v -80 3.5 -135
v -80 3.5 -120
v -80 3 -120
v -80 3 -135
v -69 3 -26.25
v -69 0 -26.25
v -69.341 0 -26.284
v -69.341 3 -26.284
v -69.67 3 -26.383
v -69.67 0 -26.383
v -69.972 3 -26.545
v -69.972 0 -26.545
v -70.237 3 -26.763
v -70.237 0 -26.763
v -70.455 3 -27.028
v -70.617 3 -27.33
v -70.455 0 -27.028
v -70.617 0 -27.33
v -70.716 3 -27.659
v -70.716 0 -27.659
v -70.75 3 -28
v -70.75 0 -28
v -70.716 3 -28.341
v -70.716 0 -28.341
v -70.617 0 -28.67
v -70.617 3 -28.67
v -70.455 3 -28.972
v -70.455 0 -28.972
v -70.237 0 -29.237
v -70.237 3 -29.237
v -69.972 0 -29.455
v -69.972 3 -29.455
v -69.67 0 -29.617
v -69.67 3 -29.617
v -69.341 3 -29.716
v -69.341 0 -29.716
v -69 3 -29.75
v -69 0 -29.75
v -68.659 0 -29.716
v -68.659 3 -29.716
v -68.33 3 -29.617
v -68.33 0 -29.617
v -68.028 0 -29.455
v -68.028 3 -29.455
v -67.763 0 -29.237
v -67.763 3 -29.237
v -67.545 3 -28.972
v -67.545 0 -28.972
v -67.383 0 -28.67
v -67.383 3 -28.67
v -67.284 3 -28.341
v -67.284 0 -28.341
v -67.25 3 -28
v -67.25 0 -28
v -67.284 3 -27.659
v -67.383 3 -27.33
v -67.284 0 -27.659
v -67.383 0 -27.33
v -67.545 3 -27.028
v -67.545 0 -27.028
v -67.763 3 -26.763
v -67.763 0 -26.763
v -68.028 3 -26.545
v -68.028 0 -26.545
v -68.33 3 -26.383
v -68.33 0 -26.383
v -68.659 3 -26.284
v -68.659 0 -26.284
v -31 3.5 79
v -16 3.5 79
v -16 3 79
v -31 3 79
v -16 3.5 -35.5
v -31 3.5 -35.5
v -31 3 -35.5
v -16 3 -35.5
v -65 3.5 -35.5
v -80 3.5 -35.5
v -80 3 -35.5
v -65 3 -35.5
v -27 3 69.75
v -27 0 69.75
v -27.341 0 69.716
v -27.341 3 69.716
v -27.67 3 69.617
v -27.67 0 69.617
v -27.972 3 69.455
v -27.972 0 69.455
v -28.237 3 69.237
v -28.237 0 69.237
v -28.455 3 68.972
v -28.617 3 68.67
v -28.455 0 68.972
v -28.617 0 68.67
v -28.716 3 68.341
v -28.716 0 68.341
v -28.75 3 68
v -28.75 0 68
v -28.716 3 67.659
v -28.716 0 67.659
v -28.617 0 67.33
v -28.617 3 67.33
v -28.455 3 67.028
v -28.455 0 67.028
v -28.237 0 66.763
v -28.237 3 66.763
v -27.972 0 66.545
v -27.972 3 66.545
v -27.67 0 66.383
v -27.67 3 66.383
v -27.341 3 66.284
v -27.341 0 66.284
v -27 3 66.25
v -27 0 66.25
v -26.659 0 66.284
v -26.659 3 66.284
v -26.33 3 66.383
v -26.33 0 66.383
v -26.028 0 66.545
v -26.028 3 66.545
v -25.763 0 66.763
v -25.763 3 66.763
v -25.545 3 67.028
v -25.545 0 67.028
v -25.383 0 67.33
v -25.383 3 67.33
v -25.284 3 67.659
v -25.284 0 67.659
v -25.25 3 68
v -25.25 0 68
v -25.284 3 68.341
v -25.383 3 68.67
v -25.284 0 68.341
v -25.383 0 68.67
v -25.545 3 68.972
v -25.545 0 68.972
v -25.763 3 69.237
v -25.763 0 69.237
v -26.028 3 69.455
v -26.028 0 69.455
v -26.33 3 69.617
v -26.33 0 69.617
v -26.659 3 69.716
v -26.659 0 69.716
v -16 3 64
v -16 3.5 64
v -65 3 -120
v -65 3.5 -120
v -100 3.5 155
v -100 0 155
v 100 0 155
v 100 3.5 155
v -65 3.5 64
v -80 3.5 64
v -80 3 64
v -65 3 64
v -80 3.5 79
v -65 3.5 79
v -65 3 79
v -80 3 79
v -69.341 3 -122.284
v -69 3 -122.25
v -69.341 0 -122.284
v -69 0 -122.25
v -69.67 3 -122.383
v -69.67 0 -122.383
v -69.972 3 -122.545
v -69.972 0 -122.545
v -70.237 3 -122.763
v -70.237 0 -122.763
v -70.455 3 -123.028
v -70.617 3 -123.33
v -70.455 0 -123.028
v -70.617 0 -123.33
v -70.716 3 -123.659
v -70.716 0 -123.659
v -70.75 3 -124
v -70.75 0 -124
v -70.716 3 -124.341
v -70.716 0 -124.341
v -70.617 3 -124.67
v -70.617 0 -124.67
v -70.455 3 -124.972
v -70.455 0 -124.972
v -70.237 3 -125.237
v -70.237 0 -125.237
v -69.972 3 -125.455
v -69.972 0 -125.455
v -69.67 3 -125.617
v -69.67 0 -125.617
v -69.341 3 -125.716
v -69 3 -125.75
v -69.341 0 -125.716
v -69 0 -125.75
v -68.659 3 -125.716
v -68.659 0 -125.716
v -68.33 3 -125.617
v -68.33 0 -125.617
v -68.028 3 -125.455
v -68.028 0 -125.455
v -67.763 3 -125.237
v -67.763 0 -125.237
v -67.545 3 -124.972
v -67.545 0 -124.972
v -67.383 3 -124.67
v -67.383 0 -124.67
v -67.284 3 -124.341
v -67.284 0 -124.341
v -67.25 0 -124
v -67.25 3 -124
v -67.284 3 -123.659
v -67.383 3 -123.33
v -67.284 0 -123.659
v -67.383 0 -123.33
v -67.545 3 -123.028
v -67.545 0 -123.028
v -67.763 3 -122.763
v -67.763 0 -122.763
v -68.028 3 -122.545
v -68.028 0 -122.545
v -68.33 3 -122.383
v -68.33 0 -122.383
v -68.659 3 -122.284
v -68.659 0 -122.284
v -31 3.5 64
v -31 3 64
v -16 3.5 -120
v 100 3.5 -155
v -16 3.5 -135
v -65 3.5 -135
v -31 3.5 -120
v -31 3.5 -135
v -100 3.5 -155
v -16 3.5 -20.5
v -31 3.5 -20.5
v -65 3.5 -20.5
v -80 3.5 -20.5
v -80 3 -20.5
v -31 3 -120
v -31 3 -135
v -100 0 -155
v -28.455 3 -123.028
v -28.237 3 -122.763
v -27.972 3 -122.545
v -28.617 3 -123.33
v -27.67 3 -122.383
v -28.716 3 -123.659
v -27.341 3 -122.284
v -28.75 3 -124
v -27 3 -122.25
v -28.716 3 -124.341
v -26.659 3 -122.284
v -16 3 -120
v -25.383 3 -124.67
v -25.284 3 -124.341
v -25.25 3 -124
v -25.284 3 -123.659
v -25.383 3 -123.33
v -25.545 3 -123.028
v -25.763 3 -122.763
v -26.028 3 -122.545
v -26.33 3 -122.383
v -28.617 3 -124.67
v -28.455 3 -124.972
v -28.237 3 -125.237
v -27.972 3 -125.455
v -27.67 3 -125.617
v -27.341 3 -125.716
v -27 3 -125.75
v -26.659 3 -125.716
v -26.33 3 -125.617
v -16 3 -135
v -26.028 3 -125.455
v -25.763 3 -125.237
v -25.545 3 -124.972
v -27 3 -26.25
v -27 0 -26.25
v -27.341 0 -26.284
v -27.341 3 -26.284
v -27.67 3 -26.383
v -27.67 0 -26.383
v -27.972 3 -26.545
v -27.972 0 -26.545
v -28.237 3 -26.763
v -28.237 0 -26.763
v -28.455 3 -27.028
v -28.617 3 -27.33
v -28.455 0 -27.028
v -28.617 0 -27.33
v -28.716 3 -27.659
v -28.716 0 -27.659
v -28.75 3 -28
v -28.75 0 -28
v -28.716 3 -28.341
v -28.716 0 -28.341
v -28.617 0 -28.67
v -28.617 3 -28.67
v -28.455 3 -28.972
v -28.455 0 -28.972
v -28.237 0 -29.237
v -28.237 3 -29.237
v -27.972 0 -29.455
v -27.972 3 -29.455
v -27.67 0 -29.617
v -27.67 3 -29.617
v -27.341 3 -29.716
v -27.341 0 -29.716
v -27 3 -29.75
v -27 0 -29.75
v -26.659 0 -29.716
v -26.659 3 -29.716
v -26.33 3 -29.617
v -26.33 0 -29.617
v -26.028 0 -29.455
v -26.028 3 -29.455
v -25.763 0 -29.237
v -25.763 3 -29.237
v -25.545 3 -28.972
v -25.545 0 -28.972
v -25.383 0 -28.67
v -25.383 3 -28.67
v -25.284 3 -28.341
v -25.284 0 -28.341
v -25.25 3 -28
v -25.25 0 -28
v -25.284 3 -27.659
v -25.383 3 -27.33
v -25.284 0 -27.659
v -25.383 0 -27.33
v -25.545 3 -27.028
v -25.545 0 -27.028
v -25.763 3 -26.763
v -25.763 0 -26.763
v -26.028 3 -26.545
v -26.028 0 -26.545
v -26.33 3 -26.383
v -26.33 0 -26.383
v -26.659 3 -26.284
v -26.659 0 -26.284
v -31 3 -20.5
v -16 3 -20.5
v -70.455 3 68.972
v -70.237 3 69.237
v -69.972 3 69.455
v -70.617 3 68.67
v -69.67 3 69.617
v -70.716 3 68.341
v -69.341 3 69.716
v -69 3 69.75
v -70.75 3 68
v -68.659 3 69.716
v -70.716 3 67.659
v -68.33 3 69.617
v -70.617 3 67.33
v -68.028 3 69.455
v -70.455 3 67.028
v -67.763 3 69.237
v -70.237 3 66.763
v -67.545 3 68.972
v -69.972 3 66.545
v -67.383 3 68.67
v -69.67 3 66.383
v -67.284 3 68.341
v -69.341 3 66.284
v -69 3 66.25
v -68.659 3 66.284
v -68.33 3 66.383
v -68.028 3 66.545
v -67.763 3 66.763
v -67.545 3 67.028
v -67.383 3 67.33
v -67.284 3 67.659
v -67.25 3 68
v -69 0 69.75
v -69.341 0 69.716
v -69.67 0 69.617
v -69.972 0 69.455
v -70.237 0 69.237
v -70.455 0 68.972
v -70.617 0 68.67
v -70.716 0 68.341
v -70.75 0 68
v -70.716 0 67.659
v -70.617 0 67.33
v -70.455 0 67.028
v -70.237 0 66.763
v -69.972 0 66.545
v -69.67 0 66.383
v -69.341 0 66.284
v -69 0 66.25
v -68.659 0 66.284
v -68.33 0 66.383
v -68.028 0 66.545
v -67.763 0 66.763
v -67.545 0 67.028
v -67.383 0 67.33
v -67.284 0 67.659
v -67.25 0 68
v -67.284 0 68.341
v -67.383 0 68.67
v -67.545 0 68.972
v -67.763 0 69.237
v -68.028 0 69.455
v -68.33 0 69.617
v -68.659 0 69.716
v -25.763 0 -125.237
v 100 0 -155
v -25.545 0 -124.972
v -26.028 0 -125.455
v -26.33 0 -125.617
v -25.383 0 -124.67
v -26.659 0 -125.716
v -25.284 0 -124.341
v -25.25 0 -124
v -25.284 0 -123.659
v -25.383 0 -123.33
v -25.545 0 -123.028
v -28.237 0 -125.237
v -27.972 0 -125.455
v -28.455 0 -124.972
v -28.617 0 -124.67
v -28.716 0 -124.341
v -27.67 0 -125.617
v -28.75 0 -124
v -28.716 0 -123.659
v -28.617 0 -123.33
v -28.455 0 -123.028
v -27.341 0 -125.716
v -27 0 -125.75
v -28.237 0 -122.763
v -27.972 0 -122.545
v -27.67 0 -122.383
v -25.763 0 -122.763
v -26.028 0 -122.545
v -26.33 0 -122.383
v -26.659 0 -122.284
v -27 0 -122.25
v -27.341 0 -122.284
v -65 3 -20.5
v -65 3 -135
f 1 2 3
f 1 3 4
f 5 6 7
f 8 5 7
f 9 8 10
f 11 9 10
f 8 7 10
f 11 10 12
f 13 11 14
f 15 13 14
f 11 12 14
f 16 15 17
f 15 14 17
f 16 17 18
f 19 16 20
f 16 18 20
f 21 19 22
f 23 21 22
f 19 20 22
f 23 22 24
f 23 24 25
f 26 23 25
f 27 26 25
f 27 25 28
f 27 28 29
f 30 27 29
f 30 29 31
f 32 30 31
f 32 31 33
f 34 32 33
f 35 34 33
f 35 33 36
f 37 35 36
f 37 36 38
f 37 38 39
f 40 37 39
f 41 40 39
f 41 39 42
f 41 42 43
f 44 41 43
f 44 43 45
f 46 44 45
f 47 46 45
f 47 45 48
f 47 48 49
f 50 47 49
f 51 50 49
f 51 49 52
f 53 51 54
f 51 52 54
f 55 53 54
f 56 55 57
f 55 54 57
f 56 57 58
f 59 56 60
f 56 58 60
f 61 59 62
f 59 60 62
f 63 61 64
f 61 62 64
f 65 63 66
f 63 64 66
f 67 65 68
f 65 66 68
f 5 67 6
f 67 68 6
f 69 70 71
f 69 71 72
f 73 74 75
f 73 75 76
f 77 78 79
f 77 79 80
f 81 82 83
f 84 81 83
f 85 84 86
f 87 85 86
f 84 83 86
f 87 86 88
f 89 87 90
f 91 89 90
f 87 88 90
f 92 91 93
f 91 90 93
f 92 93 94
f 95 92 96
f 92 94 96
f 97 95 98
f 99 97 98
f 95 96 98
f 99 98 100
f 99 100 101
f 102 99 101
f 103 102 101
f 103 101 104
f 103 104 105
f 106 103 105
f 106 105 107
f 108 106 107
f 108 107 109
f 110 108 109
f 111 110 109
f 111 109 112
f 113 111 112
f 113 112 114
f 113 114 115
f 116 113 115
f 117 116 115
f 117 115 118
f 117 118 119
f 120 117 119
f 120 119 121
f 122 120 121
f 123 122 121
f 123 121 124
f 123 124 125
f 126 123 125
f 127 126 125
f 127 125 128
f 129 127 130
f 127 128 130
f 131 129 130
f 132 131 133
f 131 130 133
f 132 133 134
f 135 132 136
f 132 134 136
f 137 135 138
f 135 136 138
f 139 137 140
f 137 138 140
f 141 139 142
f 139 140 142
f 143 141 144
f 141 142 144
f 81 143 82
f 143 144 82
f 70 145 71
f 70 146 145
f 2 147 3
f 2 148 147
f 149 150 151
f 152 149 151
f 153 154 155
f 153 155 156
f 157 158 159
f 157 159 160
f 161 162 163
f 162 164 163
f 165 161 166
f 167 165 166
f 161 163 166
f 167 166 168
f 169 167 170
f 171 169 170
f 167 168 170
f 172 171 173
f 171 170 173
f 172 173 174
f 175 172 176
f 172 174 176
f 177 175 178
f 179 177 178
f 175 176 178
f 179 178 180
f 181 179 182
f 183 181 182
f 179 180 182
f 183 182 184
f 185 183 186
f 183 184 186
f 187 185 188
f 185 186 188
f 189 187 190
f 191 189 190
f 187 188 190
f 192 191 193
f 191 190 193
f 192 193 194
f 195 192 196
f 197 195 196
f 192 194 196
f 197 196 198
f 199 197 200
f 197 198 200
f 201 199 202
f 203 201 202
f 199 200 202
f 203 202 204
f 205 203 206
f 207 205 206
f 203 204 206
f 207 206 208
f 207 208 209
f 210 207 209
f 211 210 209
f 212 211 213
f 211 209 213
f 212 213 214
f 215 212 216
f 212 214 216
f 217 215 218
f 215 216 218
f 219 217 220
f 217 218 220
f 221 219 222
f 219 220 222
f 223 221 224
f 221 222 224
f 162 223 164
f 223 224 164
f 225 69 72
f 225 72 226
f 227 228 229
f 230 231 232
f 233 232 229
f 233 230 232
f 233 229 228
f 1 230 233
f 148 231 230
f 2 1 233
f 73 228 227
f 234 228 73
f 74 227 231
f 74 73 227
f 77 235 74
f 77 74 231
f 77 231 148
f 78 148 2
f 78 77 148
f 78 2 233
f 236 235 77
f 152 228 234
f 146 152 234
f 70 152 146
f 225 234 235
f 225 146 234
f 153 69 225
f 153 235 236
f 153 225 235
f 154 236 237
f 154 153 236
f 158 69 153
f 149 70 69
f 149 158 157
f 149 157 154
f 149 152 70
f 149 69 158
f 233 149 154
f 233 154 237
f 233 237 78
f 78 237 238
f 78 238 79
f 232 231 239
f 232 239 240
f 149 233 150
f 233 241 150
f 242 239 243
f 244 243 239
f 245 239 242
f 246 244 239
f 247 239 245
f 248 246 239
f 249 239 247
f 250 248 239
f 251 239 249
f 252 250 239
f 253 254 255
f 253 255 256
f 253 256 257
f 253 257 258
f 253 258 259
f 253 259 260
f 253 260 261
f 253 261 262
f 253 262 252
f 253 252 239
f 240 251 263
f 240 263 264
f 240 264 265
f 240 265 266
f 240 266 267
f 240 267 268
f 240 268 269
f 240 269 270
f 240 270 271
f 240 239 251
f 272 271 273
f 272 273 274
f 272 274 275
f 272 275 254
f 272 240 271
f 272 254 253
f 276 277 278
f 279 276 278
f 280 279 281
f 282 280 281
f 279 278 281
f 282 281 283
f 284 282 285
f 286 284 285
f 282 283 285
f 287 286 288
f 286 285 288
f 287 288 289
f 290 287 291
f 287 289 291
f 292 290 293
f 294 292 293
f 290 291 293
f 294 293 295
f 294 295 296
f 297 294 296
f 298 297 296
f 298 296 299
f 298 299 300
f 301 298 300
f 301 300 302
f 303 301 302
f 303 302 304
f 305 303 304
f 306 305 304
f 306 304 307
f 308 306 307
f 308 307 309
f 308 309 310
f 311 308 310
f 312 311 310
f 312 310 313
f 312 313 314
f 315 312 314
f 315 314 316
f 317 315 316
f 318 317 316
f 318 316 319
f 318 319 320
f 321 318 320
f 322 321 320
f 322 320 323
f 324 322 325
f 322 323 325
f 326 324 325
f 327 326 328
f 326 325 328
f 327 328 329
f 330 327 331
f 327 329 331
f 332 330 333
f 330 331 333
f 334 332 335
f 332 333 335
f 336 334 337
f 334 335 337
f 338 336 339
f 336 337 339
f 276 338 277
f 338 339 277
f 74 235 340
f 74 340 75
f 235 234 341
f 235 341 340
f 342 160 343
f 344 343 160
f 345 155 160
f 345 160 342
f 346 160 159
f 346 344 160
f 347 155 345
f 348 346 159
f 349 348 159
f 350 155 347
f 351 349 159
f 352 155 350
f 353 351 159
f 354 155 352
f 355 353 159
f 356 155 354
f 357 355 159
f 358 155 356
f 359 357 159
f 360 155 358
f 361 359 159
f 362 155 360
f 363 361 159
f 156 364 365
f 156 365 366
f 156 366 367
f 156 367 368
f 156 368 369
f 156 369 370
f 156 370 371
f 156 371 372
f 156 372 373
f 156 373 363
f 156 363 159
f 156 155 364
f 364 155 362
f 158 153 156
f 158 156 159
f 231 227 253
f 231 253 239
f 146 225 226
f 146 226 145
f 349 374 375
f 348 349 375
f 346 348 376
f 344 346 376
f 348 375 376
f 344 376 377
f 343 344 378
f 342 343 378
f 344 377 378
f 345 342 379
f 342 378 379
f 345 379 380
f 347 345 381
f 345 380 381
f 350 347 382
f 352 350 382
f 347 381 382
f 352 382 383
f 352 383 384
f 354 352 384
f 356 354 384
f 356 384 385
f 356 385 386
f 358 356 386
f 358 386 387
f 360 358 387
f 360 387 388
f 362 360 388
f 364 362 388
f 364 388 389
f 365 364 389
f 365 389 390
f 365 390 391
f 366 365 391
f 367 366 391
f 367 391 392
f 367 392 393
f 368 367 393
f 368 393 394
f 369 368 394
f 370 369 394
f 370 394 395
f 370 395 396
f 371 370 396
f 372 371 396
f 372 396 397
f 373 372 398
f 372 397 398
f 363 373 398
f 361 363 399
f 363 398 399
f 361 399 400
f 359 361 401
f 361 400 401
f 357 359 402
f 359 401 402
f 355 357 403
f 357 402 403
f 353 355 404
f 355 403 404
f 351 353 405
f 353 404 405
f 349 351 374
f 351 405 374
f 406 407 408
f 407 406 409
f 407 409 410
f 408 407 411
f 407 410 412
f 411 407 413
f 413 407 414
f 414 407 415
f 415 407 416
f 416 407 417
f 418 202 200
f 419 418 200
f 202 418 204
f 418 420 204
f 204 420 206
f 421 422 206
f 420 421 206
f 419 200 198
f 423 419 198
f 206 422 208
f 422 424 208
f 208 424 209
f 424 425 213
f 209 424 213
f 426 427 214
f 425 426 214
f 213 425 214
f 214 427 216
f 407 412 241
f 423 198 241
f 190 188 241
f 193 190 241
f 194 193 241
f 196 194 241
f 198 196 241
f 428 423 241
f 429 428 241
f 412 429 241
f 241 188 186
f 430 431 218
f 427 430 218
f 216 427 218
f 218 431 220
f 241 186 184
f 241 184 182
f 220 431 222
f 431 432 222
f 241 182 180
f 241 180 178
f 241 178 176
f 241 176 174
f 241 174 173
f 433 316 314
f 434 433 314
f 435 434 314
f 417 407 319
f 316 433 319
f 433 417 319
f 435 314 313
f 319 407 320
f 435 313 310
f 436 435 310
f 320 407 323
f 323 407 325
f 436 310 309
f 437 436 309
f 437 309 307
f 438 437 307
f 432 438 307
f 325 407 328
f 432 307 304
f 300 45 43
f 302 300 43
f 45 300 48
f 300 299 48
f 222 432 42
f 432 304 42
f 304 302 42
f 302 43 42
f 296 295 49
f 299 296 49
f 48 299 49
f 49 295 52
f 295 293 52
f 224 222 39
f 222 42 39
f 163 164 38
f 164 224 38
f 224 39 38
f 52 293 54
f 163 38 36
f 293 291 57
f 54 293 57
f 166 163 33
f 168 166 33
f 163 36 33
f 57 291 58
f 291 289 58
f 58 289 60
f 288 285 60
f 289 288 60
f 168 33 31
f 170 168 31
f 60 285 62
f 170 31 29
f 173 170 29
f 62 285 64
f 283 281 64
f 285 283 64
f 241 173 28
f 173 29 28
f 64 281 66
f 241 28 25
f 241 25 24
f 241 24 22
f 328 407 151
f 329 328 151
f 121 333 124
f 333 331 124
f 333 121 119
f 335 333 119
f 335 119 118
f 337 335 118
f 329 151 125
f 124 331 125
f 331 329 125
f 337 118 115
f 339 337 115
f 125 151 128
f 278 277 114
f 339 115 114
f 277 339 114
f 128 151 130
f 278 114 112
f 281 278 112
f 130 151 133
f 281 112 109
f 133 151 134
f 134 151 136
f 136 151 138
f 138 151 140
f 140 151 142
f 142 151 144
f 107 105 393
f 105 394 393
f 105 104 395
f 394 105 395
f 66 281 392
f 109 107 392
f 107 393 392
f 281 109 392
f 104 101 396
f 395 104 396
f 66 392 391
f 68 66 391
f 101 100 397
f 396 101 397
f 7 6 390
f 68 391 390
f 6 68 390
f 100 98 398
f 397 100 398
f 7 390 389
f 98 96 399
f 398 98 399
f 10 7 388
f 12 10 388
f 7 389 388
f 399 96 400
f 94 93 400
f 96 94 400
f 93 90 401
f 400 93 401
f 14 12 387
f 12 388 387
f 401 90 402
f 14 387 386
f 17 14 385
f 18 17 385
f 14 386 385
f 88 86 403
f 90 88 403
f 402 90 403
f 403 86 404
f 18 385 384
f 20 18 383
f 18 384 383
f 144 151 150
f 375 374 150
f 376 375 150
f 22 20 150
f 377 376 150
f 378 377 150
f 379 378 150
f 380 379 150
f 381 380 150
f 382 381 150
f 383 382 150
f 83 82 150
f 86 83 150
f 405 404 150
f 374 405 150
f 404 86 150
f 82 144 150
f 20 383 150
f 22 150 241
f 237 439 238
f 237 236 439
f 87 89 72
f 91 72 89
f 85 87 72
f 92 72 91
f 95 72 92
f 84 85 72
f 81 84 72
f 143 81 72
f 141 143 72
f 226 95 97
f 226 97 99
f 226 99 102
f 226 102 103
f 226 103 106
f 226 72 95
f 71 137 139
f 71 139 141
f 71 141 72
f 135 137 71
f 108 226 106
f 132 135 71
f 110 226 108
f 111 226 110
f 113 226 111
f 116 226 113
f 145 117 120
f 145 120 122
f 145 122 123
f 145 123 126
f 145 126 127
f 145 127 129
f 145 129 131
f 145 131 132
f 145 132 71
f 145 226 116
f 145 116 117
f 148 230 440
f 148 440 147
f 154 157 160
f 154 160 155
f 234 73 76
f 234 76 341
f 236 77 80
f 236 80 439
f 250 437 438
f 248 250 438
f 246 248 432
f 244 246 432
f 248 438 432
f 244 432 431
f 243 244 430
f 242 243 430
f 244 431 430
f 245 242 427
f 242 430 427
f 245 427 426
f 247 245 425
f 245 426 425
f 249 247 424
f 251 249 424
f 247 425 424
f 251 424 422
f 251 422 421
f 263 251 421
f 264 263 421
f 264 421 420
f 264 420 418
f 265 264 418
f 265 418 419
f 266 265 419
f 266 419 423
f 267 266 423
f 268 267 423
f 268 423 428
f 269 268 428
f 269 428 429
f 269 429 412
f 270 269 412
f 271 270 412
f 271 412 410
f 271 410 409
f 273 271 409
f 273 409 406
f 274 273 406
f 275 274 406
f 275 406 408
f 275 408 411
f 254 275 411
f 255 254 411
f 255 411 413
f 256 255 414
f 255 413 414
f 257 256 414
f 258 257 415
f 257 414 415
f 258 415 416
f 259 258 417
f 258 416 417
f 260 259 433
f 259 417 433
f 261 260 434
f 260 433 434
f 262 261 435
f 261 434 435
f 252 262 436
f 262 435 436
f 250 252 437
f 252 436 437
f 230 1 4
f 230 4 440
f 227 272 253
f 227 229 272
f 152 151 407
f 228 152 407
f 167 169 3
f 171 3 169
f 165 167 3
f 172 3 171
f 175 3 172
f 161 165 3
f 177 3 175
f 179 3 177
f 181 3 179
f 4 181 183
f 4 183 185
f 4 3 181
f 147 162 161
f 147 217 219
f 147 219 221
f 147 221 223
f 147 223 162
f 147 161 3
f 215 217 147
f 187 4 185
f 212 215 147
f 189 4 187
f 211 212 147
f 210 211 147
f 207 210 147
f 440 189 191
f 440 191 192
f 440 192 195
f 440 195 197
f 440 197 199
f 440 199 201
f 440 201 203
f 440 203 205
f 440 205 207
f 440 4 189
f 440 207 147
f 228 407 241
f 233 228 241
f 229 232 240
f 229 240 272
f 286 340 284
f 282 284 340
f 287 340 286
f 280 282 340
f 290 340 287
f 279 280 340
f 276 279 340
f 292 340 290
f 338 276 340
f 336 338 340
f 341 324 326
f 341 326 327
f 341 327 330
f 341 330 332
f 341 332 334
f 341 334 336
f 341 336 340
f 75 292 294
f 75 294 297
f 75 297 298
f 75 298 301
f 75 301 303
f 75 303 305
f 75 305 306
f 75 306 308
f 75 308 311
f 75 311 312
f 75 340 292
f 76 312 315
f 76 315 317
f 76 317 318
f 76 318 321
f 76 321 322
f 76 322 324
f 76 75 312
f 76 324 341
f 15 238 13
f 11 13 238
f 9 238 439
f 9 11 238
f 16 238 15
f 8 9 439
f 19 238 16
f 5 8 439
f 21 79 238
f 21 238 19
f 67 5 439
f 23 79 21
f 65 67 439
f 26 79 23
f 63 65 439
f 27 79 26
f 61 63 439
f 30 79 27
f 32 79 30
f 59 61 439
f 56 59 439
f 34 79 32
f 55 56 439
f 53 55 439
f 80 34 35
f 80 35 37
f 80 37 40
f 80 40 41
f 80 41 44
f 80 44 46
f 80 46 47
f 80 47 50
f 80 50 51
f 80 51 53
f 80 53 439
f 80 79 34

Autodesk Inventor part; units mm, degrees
ref_plane "YZ Plane" through (0, 0, 0) normal (1, 0, 0) x (0, 1, 0)
ref_plane "XZ Plane" through (0, 0, 0) normal (0, 1, 0) x (-1, 0, 0)
ref_plane "XY Plane" through (0, 0, 0) normal (0, 0, 1) x (1, 0, 0)
sketch "Sketch1" plane through (0, 0, 0) normal (0, 1, 0) x (-1, 0, 0)
  line L0 (100, 155) -> (-100, 155)
  line L1 (-100, 155) -> (-100, -155)
  line L2 (-100, -155) -> (100, -155)
  line L3 (100, -155) -> (100, 155)
  point P0 (0, 0)
  point P1 (100, 0)
  point P2 (0, -155)
  dimension "d0" = 200
  dimension "d1" = 310
extrude "Extrusion1" add sketch "Sketch1" along normal blind 3.5
sketch "Sketch3" plane through (0, 3.5, 0) normal (0, 1, 0) x (1, 0, 0)
  line L0 (-80, 135) -> (-65, 135)
  line L1 (-65, 135) -> (-65, 120)
  line L2 (-65, 120) -> (-80, 120)
  line L3 (-80, 120) -> (-80, 135)
  line L4 (-31, 135) -> (-16, 135)
  line L5 (-16, 135) -> (-16, 120)
  line L6 (-16, 120) -> (-31, 120)
  line L7 (-31, 120) -> (-31, 135)
  line L8 (-80, 35.5) -> (-65, 35.5)
  line L9 (-65, 35.5) -> (-65, 20.5)
  line L10 (-65, 20.5) -> (-80, 20.5)
  line L11 (-80, 20.5) -> (-80, 35.5)
  line L12 (-31, 35.5) -> (-16, 35.5)
  line L13 (-16, 35.5) -> (-16, 20.5)
  line L14 (-16, 20.5) -> (-31, 20.5)
  line L15 (-31, 20.5) -> (-31, 35.5)
  line L16 (-80, -64) -> (-65, -64)
  line L17 (-65, -64) -> (-65, -79)
  line L18 (-65, -79) -> (-80, -79)
  line L19 (-80, -79) -> (-80, -64)
  line L20 (-31, -64) -> (-16, -64)
  line L21 (-16, -64) -> (-16, -79)
  line L22 (-16, -79) -> (-31, -79)
  line L23 (-31, -79) -> (-31, -64)
  line L24 (-100, 155) -> (-100, -155) projected
  line L25 (100, 155) -> (-100, 155) projected
  point P0 (0, 0)
  dimension "d4" = 15
  dimension "d5" = 15
  dimension "d8" = 49
  dimension "d11" = 99.5
  dimension "d14" = 20
  dimension "d15" = 20
extrude "Extrusion2" cut sketch "Sketch3" against normal blind 0.5
sketch "Sketch4" plane through (0, 3, 0) normal (0, 1, 0) x (1, 0, 0)
  line L0 (-65, 135) -> (-65, 120) projected
  line L1 (-65, 120) -> (-80, 120) projected
  line L2 (-65, 35.5) -> (-65, 20.5) projected
  line L3 (-31, 20.5) -> (-31, 35.5) projected
  line L4 (-80, -64) -> (-65, -64) projected
  line L5 (-31, -79) -> (-31, -64) projected
  point P0 (0, 0)
  point P1 (-69, 28)
  point P2 (-27, 28)
  point P3 (-69, -68)
  point P4 (-27, -68)
  point P5 (-69, 124)
  point P6 (-27, 124)
  point P7 (-65, 28)
  point P8 (-31, 28)
  dimension "d18" = 4
  dimension "d19" = 4
  dimension "d20" = 4
  dimension "d21" = 4
hole "Hole1" at (-69, 3, -28) at (-27, 3, -28) at (-69, 3, 68) at (-27, 3, 68) at (-69, 3, -124) at (-27, 3, -124) direction (0, -1, 0) diameter 3.5 end through all
properties part number "BaseCase"
